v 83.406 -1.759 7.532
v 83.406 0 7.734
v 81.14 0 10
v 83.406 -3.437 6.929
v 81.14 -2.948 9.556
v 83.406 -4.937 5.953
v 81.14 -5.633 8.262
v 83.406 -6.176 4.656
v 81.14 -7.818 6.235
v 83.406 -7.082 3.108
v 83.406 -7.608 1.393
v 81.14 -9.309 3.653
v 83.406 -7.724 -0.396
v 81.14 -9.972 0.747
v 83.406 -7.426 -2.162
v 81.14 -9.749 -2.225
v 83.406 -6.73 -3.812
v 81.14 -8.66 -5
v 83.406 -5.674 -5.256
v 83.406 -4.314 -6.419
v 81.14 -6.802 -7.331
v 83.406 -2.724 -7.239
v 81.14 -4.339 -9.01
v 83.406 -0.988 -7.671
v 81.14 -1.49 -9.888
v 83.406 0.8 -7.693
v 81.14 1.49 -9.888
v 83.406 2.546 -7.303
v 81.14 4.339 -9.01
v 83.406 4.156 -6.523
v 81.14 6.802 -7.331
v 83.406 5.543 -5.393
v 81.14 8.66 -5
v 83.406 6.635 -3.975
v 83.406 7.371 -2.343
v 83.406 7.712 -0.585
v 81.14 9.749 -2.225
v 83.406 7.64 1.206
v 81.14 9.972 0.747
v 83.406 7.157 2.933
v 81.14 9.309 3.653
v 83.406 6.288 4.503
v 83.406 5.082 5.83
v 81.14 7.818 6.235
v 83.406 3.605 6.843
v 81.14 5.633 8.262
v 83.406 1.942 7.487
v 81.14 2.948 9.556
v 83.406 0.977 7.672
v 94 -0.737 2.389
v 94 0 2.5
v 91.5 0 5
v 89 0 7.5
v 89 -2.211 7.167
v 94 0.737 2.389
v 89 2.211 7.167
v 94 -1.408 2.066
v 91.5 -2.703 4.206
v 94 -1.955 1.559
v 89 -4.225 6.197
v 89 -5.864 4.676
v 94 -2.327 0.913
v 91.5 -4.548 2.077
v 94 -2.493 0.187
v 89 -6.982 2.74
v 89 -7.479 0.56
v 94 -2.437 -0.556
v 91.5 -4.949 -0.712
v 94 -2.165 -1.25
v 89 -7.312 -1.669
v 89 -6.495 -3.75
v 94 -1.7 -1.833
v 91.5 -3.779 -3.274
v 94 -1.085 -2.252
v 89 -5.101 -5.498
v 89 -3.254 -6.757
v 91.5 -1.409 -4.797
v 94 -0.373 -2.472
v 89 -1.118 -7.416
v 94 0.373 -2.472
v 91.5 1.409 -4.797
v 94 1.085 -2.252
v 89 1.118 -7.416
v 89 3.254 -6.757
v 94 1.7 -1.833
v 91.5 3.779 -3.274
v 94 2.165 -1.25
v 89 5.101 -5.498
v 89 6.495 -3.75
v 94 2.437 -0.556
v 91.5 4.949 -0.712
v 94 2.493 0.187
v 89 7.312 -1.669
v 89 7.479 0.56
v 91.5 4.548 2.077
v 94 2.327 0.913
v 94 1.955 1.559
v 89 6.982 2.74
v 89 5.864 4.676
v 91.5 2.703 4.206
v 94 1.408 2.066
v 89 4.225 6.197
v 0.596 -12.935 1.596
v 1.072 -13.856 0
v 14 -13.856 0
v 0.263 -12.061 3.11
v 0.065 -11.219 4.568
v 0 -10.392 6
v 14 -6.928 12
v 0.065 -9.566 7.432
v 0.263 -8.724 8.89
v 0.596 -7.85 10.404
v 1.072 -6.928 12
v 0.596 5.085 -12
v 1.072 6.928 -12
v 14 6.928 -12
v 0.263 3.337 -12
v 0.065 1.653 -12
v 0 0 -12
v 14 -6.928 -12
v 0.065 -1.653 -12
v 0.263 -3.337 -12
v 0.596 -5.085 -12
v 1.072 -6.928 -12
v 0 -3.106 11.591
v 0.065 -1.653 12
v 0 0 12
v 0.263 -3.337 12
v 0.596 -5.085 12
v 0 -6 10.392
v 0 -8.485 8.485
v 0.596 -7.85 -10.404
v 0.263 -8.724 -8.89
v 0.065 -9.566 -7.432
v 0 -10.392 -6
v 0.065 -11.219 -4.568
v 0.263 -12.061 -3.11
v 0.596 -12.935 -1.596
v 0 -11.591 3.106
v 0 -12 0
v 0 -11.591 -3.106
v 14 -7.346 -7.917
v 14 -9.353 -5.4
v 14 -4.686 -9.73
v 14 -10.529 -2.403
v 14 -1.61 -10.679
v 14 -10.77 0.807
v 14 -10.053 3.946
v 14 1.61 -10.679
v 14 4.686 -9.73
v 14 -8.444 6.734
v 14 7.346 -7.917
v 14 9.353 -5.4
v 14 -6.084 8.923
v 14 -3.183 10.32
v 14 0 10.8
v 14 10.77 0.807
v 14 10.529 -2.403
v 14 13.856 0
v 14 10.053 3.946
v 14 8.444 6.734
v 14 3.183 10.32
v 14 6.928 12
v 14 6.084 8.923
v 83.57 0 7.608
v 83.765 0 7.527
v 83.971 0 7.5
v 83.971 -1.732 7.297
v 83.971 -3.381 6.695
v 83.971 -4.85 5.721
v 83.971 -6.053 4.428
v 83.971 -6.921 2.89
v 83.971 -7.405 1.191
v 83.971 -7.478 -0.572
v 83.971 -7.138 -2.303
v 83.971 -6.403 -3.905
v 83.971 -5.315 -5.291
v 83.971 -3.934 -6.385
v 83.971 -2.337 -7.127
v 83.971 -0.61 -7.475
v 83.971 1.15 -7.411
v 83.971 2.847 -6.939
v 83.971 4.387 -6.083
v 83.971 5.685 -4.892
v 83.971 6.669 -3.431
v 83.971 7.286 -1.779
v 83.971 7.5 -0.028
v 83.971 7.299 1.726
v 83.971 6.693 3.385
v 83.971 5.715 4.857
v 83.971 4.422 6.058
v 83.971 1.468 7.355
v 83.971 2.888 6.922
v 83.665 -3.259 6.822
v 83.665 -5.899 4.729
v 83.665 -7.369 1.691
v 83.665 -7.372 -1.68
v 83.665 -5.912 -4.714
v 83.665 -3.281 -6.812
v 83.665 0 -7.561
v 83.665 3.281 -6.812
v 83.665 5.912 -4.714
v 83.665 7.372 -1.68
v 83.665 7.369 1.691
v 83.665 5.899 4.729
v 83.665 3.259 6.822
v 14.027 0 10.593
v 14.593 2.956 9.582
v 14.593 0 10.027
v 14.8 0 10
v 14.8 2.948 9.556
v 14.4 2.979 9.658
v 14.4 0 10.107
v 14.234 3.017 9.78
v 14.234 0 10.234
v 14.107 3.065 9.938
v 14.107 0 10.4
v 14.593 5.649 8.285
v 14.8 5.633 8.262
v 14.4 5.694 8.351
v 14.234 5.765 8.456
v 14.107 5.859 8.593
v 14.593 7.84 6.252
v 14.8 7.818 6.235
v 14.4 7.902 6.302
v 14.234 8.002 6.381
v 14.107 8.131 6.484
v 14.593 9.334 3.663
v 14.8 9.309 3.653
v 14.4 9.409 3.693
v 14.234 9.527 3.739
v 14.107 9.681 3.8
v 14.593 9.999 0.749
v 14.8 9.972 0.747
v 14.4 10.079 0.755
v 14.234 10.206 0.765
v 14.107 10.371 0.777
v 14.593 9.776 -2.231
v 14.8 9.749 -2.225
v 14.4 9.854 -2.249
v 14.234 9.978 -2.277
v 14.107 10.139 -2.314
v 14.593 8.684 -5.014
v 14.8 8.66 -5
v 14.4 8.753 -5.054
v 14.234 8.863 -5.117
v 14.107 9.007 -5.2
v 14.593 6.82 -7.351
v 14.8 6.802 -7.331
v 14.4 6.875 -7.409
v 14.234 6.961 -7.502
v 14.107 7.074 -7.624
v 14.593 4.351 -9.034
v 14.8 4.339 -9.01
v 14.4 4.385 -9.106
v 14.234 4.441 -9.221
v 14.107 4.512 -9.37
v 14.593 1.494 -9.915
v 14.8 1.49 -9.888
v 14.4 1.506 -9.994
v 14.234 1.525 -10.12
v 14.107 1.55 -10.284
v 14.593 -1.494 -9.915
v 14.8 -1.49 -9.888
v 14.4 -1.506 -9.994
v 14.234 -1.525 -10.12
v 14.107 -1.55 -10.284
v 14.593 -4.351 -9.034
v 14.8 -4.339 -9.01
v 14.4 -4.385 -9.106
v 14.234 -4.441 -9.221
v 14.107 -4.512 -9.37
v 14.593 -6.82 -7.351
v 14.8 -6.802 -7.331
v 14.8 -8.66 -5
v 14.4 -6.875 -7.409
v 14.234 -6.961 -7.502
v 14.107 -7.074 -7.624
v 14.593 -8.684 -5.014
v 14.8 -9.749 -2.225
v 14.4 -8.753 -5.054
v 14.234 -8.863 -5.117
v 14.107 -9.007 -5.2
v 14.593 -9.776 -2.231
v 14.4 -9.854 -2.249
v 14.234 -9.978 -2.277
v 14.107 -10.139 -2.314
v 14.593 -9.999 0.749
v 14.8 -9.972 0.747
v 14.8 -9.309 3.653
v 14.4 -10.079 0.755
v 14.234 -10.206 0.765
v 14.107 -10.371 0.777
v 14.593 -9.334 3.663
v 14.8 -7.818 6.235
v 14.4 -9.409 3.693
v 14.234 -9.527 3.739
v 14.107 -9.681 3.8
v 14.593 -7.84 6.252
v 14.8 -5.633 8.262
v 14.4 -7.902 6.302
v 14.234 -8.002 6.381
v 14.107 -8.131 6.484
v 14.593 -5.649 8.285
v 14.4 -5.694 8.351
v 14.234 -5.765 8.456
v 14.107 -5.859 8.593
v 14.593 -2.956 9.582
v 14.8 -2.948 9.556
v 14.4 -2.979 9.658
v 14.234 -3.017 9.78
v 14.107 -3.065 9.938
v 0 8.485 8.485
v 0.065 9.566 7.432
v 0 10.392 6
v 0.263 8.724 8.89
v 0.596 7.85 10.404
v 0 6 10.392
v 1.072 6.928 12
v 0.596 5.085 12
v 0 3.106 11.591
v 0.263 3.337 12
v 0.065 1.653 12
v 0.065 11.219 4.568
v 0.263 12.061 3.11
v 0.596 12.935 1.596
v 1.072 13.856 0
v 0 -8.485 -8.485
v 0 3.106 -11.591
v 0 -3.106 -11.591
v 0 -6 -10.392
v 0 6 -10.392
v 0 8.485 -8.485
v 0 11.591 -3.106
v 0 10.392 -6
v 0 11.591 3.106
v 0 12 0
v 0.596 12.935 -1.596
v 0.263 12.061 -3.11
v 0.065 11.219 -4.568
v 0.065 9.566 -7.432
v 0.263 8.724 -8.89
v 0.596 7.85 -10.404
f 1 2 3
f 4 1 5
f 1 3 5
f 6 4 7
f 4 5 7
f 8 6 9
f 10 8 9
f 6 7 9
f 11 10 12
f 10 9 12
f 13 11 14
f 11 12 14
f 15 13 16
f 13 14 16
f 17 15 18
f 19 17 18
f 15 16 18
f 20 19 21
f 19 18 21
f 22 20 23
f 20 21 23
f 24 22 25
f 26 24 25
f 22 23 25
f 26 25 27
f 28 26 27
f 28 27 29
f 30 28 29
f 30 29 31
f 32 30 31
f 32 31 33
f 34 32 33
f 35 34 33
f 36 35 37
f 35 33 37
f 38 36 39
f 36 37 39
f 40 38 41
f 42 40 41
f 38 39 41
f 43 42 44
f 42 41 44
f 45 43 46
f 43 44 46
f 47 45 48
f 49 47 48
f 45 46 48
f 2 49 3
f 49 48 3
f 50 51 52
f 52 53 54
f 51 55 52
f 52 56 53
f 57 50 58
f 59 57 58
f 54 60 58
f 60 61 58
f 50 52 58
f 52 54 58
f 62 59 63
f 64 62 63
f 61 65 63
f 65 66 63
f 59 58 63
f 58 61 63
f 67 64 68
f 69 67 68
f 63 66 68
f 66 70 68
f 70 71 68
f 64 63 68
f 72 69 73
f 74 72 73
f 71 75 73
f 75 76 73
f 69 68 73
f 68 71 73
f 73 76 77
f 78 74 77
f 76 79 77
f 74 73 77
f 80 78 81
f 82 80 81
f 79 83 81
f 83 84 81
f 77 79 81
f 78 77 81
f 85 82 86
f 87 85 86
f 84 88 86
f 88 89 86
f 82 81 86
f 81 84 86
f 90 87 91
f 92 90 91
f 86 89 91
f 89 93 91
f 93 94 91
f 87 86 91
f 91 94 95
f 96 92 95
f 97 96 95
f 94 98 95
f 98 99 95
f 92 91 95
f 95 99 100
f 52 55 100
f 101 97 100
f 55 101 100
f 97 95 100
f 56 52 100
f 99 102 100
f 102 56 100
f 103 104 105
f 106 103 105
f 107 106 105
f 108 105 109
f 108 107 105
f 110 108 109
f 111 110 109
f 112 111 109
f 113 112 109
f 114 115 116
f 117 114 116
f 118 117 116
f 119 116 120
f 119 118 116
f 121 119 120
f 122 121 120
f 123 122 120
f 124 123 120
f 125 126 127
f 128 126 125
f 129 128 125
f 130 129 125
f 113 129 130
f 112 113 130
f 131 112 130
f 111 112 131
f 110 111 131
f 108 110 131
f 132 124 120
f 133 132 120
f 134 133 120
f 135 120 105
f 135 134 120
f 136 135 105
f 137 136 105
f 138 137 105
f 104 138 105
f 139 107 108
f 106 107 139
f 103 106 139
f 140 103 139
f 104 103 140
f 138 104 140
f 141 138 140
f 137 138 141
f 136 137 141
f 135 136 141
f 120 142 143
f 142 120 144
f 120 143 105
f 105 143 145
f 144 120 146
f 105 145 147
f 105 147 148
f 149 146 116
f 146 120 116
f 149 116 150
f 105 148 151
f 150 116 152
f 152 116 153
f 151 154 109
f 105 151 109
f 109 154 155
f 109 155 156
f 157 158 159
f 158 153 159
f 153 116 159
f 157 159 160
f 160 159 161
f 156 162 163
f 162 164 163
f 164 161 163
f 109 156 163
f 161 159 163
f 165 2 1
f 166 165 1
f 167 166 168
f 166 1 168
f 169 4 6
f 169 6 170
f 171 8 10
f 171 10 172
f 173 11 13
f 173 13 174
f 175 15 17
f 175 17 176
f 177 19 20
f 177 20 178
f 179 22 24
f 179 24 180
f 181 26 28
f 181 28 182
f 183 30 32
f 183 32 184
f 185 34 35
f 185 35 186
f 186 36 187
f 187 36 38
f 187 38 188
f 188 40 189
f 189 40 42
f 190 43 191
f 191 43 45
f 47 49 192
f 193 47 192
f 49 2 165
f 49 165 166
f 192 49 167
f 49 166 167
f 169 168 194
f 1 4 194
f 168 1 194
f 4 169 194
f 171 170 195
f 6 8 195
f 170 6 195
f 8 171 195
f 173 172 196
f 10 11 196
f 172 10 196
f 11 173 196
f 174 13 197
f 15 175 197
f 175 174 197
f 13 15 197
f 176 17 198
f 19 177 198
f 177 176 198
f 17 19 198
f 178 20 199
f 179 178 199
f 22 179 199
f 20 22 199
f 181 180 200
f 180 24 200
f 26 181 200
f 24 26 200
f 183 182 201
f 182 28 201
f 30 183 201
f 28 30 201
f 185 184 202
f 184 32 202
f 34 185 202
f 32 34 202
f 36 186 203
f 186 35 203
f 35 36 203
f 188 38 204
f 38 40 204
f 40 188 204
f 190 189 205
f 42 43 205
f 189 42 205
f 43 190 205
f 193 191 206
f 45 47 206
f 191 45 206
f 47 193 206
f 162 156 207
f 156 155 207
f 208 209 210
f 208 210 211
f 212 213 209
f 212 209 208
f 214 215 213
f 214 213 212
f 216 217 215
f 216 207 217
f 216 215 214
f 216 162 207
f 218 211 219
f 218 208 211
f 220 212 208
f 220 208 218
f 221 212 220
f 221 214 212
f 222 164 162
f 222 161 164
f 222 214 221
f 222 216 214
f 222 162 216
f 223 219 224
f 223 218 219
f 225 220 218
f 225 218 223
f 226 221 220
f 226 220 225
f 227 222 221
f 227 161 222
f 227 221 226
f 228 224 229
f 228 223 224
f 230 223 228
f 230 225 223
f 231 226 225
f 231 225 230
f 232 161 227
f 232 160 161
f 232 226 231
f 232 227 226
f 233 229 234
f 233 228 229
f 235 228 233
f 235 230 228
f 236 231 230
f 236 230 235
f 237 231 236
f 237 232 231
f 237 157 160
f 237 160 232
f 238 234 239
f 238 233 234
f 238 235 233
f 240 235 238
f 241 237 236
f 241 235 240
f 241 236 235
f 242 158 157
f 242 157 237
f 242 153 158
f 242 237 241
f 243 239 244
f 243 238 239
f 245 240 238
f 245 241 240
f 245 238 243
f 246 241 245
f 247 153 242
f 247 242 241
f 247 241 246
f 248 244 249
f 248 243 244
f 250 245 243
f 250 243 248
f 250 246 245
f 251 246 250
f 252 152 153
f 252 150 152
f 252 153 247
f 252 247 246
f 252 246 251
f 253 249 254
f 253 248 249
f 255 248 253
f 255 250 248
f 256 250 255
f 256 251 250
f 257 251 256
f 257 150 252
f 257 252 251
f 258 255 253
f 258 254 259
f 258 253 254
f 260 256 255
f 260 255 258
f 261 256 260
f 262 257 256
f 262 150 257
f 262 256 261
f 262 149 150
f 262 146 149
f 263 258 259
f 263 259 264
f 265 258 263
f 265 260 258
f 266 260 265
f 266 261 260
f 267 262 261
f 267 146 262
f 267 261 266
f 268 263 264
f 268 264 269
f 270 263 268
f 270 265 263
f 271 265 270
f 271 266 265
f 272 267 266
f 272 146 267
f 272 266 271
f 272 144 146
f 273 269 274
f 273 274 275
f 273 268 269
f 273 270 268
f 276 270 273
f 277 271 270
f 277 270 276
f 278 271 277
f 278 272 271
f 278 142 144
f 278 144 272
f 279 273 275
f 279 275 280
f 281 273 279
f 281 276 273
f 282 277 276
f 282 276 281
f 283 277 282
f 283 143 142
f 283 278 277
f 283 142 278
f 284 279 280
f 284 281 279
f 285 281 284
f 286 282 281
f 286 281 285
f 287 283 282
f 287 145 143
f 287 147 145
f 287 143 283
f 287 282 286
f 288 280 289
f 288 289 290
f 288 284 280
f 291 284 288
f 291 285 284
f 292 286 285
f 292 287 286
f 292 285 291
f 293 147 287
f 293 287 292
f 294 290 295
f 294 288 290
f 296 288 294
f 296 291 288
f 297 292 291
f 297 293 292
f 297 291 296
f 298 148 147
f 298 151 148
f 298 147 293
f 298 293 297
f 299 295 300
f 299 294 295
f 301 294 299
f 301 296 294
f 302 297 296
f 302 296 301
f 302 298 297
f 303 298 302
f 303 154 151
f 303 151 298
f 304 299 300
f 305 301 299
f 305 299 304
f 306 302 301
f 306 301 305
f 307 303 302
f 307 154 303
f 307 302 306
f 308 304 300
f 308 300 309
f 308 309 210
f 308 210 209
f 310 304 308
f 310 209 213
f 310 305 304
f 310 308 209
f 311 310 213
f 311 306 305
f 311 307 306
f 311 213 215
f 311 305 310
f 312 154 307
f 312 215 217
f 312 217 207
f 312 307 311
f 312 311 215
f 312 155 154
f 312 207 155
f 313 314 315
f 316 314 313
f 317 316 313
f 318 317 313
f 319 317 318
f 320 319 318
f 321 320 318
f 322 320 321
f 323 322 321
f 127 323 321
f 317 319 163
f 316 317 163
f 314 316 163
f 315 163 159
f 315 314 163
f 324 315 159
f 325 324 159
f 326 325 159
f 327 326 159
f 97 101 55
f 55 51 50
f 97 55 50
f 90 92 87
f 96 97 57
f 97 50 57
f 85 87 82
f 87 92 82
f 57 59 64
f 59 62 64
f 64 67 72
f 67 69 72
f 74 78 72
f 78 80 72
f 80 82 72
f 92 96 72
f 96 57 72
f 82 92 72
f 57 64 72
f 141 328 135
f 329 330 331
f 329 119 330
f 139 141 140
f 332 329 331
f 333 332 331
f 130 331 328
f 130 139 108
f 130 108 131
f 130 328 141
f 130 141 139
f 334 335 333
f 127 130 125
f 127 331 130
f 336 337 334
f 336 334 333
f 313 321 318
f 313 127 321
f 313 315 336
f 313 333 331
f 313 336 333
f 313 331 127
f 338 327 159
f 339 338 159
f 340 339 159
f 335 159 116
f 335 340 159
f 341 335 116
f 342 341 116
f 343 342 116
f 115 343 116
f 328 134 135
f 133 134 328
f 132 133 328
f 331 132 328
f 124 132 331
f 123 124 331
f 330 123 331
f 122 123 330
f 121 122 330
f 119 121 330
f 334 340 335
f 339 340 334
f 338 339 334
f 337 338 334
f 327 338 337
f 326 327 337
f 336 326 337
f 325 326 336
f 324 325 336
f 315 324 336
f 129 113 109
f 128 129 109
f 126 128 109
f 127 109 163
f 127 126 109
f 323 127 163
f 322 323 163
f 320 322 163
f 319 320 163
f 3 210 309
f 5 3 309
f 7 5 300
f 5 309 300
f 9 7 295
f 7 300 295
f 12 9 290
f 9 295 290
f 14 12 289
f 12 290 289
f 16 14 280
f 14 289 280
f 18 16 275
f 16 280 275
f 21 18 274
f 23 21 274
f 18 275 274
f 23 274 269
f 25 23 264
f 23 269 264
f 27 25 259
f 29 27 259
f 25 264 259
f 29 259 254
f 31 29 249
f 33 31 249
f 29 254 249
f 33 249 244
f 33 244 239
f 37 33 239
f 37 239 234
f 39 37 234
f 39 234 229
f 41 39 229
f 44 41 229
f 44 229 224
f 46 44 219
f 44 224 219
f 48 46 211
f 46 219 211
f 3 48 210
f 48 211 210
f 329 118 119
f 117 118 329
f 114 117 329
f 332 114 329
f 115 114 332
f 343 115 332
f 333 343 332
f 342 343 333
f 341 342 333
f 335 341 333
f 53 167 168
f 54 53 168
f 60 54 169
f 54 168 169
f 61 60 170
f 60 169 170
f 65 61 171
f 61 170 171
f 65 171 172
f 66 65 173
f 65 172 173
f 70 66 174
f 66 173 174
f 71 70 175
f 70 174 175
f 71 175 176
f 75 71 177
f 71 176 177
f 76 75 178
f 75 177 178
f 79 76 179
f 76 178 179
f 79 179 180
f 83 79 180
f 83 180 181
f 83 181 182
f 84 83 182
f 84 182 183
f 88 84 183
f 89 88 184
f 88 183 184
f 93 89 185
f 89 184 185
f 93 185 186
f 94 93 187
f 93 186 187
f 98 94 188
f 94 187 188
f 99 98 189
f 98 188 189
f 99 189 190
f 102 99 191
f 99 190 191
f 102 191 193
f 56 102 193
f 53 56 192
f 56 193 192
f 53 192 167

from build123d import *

# Parameters (mm, degrees)
BASEHEAD_DEPTH = 14
HEADFILLET_R   = 0.8
POINTFILLET_R  = 0.8


with BuildPart() as part:
    # HexSke → BaseHead (new body)
    with BuildSketch(Plane(origin=(0, 0, 0), x_dir=(0, 0, -1), z_dir=(1, 0, 0))):
        Polygon((12, 6.92820323), (12, -6.92820323), (0, -13.856406461), (-12, -6.92820323), (-12, 6.92820323), (0, 13.856406461), align=None)
    extrude(amount=BASEHEAD_DEPTH)

    # BodySke → BaseBody (revolve)
    with BuildSketch(Plane.XY, mode=Mode.PRIVATE) as basebody_sk:
        Polygon((0, 0), (94, 0), (94, 2.5), (89, 7.5), (83.64, 7.5), (81.14, 10), (0, 10), align=None)
    revolve(basebody_sk.sketch.rotate(Axis((0, 0, 0), (1, 0, 0)), 90), axis=Axis((0, 0, 0), (1, 0, 0)))

    # Sketch3 → HeadChamfer (revolve, cut)
    with BuildSketch(Plane.XY):
        Polygon((0, 12), (3.958548116, 18.856406461), (3.958548116, 23.856406461), (-10, 23.856406461), (-10, 12), align=None)
    revolve(axis=Axis((0, 0, 0), (1, 0, 0)), mode=Mode.SUBTRACT)

    # HeadFillet
    headfillet_edges = [part.edges().sort_by_distance(p)[0] for p in [
        (14, 0, -10),
    ]]
    fillet(headfillet_edges, radius=HEADFILLET_R)

    # PointFillet
    pointfillet_edges = [part.edges().sort_by_distance(p)[0] for p in [
        (83.64, 0, -7.5),
    ]]
    fillet(pointfillet_edges, radius=POINTFILLET_R)


solid = part.part
